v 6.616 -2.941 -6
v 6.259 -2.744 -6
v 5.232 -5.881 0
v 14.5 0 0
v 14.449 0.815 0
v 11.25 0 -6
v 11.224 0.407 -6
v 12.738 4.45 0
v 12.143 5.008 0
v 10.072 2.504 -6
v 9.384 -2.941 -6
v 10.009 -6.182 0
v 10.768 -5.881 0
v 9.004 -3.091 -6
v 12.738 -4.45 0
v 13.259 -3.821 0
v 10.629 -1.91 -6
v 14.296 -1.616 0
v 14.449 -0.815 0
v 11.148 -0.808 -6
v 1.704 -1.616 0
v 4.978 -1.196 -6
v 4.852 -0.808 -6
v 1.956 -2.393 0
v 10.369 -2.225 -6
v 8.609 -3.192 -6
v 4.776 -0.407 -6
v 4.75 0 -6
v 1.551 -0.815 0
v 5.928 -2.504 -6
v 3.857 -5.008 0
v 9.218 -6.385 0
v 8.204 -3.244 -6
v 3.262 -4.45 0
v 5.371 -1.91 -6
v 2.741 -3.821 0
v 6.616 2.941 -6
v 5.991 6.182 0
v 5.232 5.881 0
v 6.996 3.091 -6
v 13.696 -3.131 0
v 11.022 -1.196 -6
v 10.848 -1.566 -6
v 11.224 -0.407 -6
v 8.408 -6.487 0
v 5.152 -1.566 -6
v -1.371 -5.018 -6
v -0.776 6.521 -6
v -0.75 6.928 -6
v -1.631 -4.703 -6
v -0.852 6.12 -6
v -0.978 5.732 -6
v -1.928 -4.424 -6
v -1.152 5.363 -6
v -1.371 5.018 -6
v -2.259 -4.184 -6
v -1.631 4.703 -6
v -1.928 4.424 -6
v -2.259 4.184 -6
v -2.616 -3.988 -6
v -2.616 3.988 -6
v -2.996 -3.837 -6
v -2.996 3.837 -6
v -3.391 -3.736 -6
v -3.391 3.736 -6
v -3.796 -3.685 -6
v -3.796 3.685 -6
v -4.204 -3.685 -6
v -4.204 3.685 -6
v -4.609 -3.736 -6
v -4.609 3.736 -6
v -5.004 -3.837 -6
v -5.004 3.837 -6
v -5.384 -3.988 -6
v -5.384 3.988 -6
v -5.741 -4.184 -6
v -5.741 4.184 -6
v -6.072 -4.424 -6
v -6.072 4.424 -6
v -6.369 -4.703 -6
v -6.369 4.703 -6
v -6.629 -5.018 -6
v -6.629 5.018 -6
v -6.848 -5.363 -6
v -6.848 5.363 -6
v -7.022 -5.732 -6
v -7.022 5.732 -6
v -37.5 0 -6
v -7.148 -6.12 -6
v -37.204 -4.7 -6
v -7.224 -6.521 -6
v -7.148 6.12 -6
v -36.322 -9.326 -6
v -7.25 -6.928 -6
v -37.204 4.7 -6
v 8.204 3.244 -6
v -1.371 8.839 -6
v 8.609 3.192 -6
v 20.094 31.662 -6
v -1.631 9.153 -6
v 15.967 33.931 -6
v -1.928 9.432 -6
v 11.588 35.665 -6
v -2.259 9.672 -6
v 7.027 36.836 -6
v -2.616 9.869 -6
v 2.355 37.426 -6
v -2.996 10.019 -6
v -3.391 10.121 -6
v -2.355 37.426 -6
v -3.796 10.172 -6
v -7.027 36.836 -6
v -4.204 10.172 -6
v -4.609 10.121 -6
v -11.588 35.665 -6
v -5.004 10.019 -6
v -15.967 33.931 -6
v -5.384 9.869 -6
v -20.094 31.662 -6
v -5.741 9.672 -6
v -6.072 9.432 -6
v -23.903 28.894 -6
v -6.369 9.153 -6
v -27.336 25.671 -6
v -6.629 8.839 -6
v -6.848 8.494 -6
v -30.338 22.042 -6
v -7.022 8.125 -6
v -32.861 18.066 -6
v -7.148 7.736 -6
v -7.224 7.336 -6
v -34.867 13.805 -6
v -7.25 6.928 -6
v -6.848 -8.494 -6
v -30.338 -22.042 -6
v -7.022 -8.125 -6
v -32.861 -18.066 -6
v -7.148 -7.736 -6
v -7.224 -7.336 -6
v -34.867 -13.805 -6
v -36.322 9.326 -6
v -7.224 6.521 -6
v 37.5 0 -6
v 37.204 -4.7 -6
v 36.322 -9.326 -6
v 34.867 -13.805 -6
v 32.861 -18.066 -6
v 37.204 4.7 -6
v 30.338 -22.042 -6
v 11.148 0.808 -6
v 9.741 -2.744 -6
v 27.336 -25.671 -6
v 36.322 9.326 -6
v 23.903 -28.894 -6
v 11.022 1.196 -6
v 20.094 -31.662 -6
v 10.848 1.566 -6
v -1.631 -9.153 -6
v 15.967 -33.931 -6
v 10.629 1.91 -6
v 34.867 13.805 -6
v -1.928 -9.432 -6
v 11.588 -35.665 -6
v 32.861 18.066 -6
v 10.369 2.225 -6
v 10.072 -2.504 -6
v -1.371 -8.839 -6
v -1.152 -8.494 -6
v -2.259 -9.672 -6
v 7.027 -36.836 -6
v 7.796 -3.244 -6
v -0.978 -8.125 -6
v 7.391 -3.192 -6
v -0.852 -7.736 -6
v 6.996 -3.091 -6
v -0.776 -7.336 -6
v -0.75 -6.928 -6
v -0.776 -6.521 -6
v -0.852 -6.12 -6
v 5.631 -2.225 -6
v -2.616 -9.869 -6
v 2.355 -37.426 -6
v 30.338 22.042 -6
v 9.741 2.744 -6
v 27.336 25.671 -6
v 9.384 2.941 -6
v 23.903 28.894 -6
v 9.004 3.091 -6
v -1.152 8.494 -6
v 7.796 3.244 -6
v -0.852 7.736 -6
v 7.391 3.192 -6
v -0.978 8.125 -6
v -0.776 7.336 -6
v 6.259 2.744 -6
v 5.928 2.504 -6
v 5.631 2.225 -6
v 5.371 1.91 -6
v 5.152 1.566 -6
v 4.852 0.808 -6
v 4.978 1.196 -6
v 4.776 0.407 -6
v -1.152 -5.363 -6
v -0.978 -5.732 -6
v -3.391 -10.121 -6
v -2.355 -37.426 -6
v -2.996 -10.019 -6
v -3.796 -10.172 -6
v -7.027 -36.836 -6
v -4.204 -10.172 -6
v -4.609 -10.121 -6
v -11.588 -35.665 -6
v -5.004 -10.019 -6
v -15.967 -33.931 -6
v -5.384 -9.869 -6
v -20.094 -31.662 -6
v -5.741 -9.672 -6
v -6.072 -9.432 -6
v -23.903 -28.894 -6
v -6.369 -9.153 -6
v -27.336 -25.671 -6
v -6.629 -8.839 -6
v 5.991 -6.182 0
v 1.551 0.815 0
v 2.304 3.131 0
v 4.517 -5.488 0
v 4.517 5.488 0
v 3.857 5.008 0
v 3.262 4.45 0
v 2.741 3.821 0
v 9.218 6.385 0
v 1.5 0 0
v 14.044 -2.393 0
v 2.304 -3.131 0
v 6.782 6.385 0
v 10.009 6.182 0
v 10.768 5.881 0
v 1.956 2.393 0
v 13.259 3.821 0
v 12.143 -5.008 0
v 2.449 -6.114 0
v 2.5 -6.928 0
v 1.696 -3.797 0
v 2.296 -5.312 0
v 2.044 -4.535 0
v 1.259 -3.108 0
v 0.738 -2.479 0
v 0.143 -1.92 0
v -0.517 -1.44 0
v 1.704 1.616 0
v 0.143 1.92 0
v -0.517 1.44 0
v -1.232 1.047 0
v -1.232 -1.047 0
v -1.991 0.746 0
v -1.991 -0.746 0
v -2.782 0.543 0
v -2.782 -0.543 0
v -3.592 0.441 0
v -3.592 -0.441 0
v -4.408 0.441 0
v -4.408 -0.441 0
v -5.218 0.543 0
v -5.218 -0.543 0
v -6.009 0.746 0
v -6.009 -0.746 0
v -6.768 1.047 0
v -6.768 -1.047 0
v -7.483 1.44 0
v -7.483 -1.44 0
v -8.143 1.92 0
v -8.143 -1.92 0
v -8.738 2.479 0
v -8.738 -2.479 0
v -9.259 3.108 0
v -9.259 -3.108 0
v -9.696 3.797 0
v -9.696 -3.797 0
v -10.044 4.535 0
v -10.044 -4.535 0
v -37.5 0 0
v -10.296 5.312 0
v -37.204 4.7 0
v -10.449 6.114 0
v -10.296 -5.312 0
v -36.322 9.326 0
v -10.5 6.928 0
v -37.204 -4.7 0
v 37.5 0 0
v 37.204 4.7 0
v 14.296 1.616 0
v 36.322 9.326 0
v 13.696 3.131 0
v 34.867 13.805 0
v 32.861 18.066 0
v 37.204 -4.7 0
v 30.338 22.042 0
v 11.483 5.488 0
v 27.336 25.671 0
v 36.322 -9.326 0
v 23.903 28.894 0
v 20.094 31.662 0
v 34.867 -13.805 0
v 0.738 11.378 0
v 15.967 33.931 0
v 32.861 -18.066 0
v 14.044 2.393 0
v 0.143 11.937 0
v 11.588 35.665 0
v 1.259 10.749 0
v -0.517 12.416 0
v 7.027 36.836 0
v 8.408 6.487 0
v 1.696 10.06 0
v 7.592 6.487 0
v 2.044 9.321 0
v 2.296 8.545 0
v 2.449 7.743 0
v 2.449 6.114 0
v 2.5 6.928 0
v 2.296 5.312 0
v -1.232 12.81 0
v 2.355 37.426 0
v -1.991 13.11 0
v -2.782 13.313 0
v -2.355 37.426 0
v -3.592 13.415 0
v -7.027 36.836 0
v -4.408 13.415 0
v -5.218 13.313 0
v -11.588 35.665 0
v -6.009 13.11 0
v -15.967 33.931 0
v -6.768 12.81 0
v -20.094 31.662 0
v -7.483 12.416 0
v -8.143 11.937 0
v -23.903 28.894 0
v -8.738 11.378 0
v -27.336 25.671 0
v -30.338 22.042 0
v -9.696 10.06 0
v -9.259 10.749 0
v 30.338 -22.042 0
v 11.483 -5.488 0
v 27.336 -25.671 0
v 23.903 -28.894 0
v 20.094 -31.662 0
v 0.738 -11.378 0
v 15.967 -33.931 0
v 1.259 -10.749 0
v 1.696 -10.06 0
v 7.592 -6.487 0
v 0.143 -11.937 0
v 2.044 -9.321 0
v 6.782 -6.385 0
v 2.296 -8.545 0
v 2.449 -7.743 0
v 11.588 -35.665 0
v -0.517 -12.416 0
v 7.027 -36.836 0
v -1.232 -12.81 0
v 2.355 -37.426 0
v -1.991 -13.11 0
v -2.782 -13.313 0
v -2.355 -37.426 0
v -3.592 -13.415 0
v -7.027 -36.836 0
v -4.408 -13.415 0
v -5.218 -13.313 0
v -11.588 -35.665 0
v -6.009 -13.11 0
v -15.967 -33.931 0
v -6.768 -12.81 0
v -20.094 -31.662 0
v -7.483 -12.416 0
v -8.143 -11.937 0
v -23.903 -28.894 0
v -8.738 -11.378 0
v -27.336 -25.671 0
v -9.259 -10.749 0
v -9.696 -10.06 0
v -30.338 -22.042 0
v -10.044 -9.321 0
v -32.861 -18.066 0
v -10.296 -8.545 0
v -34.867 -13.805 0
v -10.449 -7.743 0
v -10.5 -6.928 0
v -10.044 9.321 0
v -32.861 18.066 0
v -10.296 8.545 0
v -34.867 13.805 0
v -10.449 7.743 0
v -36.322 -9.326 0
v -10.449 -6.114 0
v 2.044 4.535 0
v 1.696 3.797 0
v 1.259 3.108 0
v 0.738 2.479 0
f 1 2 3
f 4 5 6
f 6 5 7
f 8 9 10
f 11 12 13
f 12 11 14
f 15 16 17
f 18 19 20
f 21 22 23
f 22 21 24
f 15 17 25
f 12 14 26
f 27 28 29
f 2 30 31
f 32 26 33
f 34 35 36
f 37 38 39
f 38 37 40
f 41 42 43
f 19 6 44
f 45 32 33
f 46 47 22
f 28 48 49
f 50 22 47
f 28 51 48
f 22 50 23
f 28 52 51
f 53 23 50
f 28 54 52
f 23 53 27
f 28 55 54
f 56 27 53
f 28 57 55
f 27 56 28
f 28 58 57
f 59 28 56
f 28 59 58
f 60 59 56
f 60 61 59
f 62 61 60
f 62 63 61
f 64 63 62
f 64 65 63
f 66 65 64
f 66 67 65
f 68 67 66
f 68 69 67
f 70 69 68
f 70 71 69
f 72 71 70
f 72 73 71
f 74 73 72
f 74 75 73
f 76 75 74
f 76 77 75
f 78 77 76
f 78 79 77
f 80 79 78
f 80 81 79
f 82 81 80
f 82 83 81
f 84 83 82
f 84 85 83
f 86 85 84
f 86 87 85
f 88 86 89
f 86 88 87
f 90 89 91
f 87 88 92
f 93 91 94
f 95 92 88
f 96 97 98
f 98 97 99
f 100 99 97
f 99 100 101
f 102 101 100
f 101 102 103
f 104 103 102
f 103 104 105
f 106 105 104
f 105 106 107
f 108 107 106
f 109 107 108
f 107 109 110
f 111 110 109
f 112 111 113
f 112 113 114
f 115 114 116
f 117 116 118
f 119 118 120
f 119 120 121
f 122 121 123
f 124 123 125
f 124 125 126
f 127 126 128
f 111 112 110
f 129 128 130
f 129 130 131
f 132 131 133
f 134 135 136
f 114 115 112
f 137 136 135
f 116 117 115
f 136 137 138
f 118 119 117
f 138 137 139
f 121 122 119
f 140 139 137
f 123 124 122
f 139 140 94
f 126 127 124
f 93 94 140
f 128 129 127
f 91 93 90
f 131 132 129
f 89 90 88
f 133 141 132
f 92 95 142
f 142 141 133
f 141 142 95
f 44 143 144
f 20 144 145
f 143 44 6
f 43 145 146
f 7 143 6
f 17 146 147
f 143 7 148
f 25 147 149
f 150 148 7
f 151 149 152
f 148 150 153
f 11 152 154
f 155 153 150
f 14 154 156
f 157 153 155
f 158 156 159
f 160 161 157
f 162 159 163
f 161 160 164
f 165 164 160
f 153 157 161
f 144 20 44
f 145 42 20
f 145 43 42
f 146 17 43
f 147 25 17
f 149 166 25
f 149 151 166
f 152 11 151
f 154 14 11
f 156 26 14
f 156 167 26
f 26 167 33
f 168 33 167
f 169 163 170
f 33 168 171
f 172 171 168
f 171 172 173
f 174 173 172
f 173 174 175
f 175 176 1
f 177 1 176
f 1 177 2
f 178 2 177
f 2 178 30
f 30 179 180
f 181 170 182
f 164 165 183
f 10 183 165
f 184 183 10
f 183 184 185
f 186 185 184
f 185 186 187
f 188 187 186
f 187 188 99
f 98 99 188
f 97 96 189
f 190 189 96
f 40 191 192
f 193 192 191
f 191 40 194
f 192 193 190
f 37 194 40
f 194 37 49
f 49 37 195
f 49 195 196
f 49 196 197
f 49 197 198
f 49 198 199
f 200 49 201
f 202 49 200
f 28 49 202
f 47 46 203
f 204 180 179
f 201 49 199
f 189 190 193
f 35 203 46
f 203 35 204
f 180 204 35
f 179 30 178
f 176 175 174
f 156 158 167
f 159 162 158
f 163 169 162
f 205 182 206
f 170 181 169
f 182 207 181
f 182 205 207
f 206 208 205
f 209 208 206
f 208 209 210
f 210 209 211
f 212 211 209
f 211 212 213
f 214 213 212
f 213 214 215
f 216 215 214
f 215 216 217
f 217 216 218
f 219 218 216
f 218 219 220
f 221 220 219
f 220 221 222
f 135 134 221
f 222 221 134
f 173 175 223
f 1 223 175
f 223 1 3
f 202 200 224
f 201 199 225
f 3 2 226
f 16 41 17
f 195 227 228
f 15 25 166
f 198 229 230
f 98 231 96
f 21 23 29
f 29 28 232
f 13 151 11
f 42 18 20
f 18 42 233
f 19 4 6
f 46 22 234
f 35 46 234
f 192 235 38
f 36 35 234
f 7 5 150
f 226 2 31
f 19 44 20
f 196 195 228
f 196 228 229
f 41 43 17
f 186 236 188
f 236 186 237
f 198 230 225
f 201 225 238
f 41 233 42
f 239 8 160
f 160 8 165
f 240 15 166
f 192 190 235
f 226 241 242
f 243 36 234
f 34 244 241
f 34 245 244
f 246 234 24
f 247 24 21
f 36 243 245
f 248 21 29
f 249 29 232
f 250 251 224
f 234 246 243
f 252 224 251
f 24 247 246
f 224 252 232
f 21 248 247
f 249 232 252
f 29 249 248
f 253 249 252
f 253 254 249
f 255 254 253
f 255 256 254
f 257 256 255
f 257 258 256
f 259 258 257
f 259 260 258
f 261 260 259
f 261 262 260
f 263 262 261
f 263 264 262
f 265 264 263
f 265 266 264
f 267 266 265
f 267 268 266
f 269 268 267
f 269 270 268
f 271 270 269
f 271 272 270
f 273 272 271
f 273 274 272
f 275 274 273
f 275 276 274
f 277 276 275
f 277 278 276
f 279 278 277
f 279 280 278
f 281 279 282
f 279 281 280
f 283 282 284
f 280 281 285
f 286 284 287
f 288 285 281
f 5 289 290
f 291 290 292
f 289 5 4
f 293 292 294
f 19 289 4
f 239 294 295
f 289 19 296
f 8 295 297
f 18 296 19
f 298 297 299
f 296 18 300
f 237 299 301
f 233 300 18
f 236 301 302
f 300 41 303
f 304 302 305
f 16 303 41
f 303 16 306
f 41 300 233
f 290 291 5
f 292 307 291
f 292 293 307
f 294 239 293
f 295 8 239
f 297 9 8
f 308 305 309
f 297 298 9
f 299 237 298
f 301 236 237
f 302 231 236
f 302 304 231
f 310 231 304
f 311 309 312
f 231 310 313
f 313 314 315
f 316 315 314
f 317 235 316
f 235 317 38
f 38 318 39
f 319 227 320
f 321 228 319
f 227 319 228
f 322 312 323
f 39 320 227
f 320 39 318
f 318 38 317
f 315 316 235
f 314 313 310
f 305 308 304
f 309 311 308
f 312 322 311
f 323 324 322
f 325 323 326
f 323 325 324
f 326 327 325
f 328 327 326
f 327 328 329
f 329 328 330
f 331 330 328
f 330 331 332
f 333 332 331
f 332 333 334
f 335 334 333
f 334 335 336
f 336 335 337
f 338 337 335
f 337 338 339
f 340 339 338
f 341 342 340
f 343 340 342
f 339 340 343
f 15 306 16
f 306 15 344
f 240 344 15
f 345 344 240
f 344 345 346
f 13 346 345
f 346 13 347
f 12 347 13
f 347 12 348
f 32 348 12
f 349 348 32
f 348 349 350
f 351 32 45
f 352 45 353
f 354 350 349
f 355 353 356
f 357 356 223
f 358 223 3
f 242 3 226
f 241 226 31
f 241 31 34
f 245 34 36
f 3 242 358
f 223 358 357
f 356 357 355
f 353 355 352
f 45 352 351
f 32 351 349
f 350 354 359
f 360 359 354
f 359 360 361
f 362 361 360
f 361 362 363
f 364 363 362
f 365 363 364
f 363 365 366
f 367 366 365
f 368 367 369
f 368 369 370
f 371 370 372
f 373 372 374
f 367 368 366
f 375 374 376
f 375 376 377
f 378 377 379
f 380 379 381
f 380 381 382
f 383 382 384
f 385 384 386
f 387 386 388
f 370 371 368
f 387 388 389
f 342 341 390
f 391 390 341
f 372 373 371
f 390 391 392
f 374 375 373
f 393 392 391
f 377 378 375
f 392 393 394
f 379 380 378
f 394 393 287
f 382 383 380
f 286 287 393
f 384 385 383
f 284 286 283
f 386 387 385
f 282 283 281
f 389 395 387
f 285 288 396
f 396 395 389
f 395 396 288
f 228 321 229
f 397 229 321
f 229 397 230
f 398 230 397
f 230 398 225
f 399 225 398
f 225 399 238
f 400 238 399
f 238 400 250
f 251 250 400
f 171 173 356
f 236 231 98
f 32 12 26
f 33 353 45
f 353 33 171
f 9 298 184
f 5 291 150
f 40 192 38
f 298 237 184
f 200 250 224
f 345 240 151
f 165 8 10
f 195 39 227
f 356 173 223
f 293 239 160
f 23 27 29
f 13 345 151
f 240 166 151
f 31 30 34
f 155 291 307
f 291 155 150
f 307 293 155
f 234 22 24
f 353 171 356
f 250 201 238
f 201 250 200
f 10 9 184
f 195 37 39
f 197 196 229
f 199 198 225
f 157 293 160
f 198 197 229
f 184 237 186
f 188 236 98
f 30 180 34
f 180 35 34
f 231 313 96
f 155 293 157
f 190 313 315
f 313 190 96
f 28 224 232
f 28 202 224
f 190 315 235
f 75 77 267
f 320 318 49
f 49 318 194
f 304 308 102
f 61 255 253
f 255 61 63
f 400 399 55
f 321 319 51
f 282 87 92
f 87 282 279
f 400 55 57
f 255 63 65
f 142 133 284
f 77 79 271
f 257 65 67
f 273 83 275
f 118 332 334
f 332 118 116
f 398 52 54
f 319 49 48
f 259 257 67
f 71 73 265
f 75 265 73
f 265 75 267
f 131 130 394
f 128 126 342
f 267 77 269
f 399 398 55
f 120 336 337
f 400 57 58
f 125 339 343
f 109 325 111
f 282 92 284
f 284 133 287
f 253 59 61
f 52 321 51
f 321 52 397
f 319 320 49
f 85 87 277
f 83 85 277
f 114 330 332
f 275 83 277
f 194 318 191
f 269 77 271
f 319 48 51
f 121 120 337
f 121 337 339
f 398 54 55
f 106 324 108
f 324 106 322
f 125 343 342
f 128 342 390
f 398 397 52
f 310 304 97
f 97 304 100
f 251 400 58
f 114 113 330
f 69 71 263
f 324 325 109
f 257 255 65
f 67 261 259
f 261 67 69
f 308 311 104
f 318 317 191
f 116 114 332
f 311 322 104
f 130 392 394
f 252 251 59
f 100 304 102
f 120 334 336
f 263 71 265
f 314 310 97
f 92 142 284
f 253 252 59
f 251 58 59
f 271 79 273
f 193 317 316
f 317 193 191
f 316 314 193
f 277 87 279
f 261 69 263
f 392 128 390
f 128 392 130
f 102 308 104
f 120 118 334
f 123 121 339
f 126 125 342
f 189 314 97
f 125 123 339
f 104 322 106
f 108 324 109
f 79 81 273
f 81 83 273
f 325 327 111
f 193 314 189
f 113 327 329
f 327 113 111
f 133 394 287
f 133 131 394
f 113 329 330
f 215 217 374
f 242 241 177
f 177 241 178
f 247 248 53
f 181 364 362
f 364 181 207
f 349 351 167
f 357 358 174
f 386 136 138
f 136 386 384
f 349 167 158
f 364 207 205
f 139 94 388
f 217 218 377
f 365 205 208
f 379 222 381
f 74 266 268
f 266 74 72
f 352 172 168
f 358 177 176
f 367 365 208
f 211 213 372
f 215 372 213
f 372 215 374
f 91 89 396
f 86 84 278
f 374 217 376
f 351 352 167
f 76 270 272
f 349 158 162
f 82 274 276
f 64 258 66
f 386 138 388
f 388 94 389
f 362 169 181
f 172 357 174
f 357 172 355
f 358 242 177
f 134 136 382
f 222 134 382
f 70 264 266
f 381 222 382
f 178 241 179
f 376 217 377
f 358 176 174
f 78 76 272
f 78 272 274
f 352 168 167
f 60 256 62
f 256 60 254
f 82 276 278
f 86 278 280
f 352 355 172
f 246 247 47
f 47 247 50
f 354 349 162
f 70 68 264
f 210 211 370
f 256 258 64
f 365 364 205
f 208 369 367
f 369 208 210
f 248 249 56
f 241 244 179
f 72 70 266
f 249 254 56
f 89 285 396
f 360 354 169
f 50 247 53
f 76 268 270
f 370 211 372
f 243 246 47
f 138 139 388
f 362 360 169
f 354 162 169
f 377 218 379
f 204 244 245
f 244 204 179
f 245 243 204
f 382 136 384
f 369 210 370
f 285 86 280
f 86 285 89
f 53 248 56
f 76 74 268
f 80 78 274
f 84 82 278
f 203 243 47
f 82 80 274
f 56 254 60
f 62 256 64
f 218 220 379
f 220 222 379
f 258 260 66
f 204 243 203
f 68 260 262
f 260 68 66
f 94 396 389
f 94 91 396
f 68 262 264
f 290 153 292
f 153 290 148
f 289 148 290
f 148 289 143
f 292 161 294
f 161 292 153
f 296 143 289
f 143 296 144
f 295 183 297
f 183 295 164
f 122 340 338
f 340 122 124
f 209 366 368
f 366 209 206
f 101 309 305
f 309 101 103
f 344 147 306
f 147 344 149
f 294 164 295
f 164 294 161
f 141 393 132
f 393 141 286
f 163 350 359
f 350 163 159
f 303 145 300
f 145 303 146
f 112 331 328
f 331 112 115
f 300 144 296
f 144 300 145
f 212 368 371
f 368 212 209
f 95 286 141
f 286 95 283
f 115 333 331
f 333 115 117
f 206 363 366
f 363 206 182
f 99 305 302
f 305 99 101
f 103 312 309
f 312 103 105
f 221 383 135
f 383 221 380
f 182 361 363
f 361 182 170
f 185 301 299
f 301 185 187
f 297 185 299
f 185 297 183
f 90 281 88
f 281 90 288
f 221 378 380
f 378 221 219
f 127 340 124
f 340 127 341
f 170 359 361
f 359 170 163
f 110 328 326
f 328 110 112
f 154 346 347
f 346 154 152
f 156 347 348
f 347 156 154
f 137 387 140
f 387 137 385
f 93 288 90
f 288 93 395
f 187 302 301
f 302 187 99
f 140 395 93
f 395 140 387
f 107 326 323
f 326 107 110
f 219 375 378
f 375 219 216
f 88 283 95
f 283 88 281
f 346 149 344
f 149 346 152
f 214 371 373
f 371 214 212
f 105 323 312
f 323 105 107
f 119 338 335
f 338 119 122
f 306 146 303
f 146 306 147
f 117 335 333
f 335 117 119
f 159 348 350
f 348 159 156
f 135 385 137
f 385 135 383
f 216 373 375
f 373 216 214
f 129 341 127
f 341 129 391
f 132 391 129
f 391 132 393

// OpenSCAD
$fn = 50;


difference() {
	union() {
		cylinder(h = 0, r = 12.5000000000);
		translate(v = [0, 0, -6.0000000000]) {
			cylinder(h = 6, r = 37.5000000000);
		}
	}
	union() {
		translate(v = [8.0000000000, 0.0000000000, 0]) {
			rotate(a = [0, 0, 0]) {
				difference() {
					union() {
						#cylinder(h = 0, r = 2.2500000000);
						#translate(v = [0, 0, -6]) {
							cylinder(h = 6, r = 12.5000000000, r1 = 3.2500000000, r2 = 6.5000000000);
						}
						#cylinder(h = 0, r = 3.2500000000);
						#cylinder(h = 0, r = 2.2500000000);
					}
					union();
				}
			}
		}
		translate(v = [-4.0000000000, 6.9282032303, 0]) {
			rotate(a = [0, 0, 0]) {
				difference() {
					union() {
						#cylinder(h = 0, r = 2.2500000000);
						#translate(v = [0, 0, -6]) {
							cylinder(h = 6, r = 12.5000000000, r1 = 3.2500000000, r2 = 6.5000000000);
						}
						#cylinder(h = 0, r = 3.2500000000);
						#cylinder(h = 0, r = 2.2500000000);
					}
					union();
				}
			}
		}
		translate(v = [-4.0000000000, -6.9282032303, 0]) {
			rotate(a = [0, 0, 0]) {
				difference() {
					union() {
						#cylinder(h = 0, r = 2.2500000000);
						#translate(v = [0, 0, -6]) {
							cylinder(h = 6, r = 12.5000000000, r1 = 3.2500000000, r2 = 6.5000000000);
						}
						#cylinder(h = 0, r = 3.2500000000);
						#cylinder(h = 0, r = 2.2500000000);
					}
					union();
				}
			}
		}
	}
}
